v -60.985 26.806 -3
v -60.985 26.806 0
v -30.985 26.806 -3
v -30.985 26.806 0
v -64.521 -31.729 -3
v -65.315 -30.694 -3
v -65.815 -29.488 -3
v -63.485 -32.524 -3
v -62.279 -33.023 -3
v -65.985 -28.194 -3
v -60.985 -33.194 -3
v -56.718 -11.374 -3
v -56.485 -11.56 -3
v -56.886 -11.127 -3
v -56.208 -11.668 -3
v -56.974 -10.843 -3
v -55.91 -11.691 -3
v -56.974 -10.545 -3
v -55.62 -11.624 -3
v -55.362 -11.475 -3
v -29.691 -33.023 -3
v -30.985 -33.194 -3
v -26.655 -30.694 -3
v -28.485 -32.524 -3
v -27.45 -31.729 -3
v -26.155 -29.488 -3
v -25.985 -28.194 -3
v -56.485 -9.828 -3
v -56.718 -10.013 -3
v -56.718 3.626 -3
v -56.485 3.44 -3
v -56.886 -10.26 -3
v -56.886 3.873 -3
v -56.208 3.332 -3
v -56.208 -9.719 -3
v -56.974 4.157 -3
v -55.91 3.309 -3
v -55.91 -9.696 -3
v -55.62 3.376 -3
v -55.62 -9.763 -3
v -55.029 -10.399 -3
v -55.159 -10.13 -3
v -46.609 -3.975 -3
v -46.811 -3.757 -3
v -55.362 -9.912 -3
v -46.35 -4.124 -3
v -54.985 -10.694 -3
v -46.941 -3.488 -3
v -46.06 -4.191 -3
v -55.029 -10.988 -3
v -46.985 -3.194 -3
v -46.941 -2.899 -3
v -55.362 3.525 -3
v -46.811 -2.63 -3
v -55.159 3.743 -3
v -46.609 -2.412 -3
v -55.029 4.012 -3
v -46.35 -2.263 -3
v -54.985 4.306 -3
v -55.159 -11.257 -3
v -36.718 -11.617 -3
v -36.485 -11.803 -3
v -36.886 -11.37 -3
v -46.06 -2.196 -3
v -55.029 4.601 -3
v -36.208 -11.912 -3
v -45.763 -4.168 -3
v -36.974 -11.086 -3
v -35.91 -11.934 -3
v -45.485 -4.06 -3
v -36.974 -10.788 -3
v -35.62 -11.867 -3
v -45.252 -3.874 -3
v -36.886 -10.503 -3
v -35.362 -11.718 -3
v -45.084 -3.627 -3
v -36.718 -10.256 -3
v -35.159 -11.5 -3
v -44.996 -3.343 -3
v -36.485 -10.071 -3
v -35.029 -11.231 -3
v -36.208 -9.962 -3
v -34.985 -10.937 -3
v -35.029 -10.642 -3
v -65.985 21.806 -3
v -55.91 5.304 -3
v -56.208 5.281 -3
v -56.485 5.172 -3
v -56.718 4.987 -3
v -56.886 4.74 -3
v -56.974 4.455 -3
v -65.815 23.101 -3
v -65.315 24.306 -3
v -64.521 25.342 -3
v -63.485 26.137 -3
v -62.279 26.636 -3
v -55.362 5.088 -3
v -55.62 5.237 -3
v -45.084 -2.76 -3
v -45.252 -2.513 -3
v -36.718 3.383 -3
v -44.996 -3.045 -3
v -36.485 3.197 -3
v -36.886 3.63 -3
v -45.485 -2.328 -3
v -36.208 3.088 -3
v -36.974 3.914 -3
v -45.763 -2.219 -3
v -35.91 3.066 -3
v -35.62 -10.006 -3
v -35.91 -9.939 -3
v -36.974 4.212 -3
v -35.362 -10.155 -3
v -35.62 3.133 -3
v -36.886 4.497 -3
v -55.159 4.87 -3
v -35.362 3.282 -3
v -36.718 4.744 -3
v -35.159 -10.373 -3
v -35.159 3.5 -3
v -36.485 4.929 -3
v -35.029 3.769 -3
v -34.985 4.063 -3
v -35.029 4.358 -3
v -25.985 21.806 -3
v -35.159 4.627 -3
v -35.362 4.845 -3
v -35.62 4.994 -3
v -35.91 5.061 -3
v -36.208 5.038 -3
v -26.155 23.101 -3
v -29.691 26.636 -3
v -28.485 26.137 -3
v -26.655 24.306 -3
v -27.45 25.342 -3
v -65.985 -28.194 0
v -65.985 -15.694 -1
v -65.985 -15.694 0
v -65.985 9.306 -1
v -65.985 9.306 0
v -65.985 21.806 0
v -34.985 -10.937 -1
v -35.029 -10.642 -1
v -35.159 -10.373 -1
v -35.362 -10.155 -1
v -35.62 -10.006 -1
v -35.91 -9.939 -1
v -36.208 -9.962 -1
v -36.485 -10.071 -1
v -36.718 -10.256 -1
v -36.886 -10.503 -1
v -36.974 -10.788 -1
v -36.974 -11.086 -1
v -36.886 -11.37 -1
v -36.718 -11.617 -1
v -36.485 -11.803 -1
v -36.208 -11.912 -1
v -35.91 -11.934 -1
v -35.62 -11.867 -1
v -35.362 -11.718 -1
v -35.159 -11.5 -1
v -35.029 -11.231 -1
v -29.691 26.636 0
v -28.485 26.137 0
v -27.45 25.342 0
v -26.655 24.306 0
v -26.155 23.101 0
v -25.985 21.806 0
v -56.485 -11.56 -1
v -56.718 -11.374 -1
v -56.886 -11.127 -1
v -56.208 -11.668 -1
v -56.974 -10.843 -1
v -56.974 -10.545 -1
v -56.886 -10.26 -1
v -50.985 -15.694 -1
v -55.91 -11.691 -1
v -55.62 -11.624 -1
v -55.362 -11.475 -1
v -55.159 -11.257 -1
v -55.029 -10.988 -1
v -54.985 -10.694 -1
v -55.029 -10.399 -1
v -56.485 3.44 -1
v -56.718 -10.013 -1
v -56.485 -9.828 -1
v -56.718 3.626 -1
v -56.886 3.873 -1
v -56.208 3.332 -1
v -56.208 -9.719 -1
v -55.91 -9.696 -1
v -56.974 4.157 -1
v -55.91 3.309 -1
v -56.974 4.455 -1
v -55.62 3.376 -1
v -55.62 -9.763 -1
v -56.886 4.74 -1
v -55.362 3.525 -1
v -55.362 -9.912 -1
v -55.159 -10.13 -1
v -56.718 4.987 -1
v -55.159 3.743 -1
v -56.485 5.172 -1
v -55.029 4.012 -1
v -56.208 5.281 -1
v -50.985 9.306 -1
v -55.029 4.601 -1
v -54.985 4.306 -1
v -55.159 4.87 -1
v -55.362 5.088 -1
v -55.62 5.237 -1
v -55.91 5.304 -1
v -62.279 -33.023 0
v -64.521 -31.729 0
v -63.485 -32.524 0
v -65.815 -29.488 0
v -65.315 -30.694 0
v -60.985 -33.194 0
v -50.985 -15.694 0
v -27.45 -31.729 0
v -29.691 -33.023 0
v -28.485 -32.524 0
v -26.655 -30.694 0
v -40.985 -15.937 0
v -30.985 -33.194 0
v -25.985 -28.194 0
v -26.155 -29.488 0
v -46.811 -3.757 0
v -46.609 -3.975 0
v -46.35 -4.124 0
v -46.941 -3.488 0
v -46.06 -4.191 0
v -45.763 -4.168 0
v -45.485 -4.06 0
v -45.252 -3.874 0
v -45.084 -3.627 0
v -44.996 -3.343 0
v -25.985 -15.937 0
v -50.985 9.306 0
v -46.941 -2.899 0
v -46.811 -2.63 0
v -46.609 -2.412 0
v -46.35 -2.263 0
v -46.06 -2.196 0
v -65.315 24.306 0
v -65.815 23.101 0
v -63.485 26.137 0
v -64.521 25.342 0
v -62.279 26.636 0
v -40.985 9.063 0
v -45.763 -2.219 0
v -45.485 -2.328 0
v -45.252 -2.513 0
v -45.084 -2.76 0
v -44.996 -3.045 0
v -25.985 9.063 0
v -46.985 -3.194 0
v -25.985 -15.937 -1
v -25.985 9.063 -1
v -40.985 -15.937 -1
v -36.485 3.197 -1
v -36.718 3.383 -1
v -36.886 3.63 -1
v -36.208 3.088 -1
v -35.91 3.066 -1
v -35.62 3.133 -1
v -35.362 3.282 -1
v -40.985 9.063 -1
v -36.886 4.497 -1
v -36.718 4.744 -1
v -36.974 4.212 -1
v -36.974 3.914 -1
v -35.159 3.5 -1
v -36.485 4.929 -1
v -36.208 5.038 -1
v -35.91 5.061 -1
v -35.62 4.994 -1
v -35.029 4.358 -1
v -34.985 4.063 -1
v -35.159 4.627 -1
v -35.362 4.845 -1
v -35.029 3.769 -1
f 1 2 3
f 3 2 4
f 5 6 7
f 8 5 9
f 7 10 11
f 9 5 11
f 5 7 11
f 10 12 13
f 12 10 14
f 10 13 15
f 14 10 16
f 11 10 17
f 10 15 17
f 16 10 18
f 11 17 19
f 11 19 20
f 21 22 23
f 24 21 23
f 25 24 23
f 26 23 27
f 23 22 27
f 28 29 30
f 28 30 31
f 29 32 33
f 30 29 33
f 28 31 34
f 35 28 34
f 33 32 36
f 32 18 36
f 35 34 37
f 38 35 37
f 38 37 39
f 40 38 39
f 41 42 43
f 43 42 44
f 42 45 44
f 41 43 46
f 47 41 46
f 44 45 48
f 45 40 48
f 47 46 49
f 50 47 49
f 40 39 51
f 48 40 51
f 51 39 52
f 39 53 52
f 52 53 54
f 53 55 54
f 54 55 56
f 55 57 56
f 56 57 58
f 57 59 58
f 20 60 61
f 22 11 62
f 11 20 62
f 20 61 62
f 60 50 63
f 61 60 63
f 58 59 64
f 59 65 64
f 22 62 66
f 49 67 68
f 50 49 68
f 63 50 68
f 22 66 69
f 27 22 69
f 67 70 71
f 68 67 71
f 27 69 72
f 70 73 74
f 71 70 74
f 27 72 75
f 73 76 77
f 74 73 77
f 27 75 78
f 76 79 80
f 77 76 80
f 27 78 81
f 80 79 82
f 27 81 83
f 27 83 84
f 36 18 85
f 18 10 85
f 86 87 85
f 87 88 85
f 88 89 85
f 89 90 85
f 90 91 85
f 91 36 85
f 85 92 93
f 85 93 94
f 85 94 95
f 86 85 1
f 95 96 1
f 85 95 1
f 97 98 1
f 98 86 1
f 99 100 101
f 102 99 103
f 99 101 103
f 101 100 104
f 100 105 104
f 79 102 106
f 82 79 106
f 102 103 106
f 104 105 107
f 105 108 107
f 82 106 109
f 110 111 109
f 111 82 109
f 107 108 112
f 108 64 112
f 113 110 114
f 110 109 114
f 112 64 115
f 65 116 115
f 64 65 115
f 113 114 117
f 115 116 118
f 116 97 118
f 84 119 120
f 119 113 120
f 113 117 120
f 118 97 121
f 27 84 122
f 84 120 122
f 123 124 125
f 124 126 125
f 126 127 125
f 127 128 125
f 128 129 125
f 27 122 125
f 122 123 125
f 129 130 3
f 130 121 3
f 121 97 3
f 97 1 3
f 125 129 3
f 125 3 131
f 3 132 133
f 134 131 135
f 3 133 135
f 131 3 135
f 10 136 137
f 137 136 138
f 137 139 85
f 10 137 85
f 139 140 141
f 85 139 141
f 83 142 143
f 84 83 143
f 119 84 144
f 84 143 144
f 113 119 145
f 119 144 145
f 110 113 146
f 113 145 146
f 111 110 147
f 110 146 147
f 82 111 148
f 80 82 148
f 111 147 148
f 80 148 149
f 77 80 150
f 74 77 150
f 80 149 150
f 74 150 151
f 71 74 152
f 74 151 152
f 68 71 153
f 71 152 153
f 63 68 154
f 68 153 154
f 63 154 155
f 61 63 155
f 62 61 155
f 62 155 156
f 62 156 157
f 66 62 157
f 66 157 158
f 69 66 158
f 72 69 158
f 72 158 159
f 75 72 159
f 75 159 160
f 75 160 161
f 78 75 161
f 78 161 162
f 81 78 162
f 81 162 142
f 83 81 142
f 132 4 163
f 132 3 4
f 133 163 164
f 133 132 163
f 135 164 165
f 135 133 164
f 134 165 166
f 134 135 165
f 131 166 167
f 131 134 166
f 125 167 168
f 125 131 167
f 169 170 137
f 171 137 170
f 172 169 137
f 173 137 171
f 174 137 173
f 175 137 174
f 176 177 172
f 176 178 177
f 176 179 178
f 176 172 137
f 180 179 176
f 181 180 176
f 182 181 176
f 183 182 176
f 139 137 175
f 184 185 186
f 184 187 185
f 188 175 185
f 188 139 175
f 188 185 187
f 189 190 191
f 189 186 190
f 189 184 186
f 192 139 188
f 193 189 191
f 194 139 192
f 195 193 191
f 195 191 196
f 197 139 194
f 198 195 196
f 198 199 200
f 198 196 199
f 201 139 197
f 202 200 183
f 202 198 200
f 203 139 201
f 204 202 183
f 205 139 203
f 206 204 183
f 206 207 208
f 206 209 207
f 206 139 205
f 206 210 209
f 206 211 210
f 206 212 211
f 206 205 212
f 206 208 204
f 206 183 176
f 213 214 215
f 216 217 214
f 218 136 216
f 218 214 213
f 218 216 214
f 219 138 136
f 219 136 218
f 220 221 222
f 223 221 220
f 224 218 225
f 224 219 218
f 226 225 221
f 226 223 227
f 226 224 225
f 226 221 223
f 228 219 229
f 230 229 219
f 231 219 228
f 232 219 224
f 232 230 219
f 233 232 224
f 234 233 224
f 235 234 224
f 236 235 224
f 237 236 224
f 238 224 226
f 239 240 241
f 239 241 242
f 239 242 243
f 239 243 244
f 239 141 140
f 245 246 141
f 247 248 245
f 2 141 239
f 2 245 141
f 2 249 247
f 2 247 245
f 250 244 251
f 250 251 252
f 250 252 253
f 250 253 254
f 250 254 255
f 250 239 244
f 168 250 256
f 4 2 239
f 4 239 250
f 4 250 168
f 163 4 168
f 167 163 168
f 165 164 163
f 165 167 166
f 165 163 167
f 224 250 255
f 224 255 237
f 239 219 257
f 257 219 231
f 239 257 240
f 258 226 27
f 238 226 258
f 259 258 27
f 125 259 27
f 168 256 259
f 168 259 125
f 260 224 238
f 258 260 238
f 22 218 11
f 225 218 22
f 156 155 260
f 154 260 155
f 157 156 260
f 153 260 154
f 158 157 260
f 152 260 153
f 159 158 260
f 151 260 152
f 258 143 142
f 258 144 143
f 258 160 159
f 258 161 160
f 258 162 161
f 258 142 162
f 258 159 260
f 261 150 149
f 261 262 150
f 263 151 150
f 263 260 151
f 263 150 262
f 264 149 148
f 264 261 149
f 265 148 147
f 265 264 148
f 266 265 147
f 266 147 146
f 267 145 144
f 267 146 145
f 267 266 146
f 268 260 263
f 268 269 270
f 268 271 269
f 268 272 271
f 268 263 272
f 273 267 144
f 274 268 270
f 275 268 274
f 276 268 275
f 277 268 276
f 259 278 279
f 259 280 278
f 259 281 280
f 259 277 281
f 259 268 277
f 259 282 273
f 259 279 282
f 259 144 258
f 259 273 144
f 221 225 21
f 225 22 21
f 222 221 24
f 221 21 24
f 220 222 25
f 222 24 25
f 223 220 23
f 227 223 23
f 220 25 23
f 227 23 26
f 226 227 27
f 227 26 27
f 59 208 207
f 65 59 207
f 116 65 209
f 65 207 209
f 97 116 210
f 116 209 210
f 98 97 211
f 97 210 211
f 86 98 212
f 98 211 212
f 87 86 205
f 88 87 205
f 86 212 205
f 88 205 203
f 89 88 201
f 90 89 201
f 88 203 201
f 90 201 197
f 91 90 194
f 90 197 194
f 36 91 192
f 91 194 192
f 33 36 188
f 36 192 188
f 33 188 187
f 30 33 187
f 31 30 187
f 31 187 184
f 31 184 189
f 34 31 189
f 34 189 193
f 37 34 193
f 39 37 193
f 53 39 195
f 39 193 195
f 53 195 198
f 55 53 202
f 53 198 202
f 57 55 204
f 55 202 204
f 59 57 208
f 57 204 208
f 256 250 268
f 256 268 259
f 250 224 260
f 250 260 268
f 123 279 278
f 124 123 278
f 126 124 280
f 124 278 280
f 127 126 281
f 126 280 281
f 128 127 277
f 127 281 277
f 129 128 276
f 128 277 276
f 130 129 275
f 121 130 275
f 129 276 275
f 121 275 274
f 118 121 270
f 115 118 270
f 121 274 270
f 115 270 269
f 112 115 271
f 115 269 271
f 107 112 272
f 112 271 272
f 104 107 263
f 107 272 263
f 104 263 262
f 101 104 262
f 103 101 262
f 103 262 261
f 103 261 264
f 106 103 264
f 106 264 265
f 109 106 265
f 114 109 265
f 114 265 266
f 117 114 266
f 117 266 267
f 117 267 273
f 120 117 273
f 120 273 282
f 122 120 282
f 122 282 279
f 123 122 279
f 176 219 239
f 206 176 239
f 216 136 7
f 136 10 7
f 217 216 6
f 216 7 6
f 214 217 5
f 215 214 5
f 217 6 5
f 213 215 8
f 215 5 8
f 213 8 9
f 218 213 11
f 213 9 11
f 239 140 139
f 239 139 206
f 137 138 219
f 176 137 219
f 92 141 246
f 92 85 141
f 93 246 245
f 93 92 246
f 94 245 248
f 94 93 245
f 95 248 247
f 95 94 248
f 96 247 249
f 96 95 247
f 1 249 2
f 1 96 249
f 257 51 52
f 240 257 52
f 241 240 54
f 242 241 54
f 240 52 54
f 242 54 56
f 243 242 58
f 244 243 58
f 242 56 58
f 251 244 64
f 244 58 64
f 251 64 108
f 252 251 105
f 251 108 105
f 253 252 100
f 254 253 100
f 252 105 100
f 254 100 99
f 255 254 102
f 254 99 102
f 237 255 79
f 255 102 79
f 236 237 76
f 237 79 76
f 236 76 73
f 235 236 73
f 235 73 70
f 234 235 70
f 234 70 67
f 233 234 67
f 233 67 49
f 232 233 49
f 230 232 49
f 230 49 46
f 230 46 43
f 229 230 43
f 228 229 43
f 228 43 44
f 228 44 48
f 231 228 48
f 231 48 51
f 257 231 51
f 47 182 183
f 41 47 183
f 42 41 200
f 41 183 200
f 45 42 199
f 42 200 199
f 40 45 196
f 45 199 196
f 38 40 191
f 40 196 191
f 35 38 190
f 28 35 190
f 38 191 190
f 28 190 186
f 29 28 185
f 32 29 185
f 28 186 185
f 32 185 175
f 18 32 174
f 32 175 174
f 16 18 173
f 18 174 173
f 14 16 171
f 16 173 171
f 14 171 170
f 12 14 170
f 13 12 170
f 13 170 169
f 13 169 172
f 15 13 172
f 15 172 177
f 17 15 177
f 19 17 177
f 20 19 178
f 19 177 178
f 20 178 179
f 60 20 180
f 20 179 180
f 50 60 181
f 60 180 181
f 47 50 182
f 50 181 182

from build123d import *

# Parameters (mm, degrees)
SKETCH1_W           = 40
SKETCH1_H           = 60
BOSS_EXTRUDE4_DEPTH = 3
SKETCH5_W           = 15
SKETCH5_H           = 25
CUT_EXTRUDE2_DEPTH  = 1
SKETCH7_R           = 1
CUT_EXTRUDE3_DEPTH  = 2
SKETCH8_R           = 1
CUT_EXTRUDE4_DEPTH  = 2
FILLET1_R           = 5
SKETCH12_R          = 1
CUT_EXTRUDE6_DEPTH  = 12
SKETCH13_W          = 15
SKETCH13_H          = 25
CUT_EXTRUDE7_DEPTH  = 1
SKETCH14_R          = 1
CUT_EXTRUDE8_DEPTH  = 7


with BuildPart() as part:
    # Sketch1 → Boss-Extrude4 (new body)
    with BuildSketch(Plane.XY):
        with Locations((-45.9850693, -3.193565597)):
            Rectangle(SKETCH1_W, SKETCH1_H)
    extrude(amount=-BOSS_EXTRUDE4_DEPTH)

    # Sketch5 → Cut-Extrude2 (cut)
    with BuildSketch(Plane.XY):
        with Locations((-58.4850693, -3.193565597)):
            Rectangle(SKETCH5_W, SKETCH5_H)
    extrude(amount=-CUT_EXTRUDE2_DEPTH, mode=Mode.SUBTRACT)

    # Sketch7 → Cut-Extrude3 (cut)
    with BuildSketch(Plane.XY.offset(-1)):
        with Locations((-55.9850693, 4.306434403)):
            Circle(SKETCH7_R)
    extrude(amount=-CUT_EXTRUDE3_DEPTH, mode=Mode.SUBTRACT)

    # Sketch8 → Cut-Extrude4 (cut)
    with BuildSketch(Plane.XY.offset(-1)):
        with Locations((-55.9850693, -10.693565597)):
            Circle(SKETCH8_R)
    extrude(amount=-CUT_EXTRUDE4_DEPTH, mode=Mode.SUBTRACT)

    # Fillet1
    fillet1_edges = [part.edges().sort_by_distance(p)[0] for p in [
        (-65.9850693, 26.806434403, -1.5),
        (-65.9850693, -33.193565597, -1.5),
        (-25.9850693, -33.193565597, -1.5),
        (-25.9850693, 26.806434403, -1.5),
    ]]
    fillet(fillet1_edges, radius=FILLET1_R)

    # Sketch12 → Cut-Extrude6 (cut)
    with BuildSketch(Plane(origin=(0, 0, -3), x_dir=(-1, 0, 0), z_dir=(0, 0, -1))):
        with Locations((45.9850693, -3.193565597)):
            Circle(SKETCH12_R)
    extrude(amount=-CUT_EXTRUDE6_DEPTH, mode=Mode.SUBTRACT)

    # Sketch13 → Cut-Extrude7 (cut)
    with BuildSketch(Plane.XY):
        with Locations((-33.4850693, -3.4366123)):
            Rectangle(SKETCH13_W, SKETCH13_H)
    extrude(amount=-CUT_EXTRUDE7_DEPTH, mode=Mode.SUBTRACT)

    # Sketch14 → Cut-Extrude8 (cut)
    with BuildSketch(Plane.XY.offset(-1)):
        with Locations((-35.9850693, 4.0633877)):
            Circle(SKETCH14_R)
        with Locations((-35.9850693, -10.9366123)):
            Circle(SKETCH14_R)
    extrude(amount=-CUT_EXTRUDE8_DEPTH, mode=Mode.SUBTRACT)


solid = part.part
